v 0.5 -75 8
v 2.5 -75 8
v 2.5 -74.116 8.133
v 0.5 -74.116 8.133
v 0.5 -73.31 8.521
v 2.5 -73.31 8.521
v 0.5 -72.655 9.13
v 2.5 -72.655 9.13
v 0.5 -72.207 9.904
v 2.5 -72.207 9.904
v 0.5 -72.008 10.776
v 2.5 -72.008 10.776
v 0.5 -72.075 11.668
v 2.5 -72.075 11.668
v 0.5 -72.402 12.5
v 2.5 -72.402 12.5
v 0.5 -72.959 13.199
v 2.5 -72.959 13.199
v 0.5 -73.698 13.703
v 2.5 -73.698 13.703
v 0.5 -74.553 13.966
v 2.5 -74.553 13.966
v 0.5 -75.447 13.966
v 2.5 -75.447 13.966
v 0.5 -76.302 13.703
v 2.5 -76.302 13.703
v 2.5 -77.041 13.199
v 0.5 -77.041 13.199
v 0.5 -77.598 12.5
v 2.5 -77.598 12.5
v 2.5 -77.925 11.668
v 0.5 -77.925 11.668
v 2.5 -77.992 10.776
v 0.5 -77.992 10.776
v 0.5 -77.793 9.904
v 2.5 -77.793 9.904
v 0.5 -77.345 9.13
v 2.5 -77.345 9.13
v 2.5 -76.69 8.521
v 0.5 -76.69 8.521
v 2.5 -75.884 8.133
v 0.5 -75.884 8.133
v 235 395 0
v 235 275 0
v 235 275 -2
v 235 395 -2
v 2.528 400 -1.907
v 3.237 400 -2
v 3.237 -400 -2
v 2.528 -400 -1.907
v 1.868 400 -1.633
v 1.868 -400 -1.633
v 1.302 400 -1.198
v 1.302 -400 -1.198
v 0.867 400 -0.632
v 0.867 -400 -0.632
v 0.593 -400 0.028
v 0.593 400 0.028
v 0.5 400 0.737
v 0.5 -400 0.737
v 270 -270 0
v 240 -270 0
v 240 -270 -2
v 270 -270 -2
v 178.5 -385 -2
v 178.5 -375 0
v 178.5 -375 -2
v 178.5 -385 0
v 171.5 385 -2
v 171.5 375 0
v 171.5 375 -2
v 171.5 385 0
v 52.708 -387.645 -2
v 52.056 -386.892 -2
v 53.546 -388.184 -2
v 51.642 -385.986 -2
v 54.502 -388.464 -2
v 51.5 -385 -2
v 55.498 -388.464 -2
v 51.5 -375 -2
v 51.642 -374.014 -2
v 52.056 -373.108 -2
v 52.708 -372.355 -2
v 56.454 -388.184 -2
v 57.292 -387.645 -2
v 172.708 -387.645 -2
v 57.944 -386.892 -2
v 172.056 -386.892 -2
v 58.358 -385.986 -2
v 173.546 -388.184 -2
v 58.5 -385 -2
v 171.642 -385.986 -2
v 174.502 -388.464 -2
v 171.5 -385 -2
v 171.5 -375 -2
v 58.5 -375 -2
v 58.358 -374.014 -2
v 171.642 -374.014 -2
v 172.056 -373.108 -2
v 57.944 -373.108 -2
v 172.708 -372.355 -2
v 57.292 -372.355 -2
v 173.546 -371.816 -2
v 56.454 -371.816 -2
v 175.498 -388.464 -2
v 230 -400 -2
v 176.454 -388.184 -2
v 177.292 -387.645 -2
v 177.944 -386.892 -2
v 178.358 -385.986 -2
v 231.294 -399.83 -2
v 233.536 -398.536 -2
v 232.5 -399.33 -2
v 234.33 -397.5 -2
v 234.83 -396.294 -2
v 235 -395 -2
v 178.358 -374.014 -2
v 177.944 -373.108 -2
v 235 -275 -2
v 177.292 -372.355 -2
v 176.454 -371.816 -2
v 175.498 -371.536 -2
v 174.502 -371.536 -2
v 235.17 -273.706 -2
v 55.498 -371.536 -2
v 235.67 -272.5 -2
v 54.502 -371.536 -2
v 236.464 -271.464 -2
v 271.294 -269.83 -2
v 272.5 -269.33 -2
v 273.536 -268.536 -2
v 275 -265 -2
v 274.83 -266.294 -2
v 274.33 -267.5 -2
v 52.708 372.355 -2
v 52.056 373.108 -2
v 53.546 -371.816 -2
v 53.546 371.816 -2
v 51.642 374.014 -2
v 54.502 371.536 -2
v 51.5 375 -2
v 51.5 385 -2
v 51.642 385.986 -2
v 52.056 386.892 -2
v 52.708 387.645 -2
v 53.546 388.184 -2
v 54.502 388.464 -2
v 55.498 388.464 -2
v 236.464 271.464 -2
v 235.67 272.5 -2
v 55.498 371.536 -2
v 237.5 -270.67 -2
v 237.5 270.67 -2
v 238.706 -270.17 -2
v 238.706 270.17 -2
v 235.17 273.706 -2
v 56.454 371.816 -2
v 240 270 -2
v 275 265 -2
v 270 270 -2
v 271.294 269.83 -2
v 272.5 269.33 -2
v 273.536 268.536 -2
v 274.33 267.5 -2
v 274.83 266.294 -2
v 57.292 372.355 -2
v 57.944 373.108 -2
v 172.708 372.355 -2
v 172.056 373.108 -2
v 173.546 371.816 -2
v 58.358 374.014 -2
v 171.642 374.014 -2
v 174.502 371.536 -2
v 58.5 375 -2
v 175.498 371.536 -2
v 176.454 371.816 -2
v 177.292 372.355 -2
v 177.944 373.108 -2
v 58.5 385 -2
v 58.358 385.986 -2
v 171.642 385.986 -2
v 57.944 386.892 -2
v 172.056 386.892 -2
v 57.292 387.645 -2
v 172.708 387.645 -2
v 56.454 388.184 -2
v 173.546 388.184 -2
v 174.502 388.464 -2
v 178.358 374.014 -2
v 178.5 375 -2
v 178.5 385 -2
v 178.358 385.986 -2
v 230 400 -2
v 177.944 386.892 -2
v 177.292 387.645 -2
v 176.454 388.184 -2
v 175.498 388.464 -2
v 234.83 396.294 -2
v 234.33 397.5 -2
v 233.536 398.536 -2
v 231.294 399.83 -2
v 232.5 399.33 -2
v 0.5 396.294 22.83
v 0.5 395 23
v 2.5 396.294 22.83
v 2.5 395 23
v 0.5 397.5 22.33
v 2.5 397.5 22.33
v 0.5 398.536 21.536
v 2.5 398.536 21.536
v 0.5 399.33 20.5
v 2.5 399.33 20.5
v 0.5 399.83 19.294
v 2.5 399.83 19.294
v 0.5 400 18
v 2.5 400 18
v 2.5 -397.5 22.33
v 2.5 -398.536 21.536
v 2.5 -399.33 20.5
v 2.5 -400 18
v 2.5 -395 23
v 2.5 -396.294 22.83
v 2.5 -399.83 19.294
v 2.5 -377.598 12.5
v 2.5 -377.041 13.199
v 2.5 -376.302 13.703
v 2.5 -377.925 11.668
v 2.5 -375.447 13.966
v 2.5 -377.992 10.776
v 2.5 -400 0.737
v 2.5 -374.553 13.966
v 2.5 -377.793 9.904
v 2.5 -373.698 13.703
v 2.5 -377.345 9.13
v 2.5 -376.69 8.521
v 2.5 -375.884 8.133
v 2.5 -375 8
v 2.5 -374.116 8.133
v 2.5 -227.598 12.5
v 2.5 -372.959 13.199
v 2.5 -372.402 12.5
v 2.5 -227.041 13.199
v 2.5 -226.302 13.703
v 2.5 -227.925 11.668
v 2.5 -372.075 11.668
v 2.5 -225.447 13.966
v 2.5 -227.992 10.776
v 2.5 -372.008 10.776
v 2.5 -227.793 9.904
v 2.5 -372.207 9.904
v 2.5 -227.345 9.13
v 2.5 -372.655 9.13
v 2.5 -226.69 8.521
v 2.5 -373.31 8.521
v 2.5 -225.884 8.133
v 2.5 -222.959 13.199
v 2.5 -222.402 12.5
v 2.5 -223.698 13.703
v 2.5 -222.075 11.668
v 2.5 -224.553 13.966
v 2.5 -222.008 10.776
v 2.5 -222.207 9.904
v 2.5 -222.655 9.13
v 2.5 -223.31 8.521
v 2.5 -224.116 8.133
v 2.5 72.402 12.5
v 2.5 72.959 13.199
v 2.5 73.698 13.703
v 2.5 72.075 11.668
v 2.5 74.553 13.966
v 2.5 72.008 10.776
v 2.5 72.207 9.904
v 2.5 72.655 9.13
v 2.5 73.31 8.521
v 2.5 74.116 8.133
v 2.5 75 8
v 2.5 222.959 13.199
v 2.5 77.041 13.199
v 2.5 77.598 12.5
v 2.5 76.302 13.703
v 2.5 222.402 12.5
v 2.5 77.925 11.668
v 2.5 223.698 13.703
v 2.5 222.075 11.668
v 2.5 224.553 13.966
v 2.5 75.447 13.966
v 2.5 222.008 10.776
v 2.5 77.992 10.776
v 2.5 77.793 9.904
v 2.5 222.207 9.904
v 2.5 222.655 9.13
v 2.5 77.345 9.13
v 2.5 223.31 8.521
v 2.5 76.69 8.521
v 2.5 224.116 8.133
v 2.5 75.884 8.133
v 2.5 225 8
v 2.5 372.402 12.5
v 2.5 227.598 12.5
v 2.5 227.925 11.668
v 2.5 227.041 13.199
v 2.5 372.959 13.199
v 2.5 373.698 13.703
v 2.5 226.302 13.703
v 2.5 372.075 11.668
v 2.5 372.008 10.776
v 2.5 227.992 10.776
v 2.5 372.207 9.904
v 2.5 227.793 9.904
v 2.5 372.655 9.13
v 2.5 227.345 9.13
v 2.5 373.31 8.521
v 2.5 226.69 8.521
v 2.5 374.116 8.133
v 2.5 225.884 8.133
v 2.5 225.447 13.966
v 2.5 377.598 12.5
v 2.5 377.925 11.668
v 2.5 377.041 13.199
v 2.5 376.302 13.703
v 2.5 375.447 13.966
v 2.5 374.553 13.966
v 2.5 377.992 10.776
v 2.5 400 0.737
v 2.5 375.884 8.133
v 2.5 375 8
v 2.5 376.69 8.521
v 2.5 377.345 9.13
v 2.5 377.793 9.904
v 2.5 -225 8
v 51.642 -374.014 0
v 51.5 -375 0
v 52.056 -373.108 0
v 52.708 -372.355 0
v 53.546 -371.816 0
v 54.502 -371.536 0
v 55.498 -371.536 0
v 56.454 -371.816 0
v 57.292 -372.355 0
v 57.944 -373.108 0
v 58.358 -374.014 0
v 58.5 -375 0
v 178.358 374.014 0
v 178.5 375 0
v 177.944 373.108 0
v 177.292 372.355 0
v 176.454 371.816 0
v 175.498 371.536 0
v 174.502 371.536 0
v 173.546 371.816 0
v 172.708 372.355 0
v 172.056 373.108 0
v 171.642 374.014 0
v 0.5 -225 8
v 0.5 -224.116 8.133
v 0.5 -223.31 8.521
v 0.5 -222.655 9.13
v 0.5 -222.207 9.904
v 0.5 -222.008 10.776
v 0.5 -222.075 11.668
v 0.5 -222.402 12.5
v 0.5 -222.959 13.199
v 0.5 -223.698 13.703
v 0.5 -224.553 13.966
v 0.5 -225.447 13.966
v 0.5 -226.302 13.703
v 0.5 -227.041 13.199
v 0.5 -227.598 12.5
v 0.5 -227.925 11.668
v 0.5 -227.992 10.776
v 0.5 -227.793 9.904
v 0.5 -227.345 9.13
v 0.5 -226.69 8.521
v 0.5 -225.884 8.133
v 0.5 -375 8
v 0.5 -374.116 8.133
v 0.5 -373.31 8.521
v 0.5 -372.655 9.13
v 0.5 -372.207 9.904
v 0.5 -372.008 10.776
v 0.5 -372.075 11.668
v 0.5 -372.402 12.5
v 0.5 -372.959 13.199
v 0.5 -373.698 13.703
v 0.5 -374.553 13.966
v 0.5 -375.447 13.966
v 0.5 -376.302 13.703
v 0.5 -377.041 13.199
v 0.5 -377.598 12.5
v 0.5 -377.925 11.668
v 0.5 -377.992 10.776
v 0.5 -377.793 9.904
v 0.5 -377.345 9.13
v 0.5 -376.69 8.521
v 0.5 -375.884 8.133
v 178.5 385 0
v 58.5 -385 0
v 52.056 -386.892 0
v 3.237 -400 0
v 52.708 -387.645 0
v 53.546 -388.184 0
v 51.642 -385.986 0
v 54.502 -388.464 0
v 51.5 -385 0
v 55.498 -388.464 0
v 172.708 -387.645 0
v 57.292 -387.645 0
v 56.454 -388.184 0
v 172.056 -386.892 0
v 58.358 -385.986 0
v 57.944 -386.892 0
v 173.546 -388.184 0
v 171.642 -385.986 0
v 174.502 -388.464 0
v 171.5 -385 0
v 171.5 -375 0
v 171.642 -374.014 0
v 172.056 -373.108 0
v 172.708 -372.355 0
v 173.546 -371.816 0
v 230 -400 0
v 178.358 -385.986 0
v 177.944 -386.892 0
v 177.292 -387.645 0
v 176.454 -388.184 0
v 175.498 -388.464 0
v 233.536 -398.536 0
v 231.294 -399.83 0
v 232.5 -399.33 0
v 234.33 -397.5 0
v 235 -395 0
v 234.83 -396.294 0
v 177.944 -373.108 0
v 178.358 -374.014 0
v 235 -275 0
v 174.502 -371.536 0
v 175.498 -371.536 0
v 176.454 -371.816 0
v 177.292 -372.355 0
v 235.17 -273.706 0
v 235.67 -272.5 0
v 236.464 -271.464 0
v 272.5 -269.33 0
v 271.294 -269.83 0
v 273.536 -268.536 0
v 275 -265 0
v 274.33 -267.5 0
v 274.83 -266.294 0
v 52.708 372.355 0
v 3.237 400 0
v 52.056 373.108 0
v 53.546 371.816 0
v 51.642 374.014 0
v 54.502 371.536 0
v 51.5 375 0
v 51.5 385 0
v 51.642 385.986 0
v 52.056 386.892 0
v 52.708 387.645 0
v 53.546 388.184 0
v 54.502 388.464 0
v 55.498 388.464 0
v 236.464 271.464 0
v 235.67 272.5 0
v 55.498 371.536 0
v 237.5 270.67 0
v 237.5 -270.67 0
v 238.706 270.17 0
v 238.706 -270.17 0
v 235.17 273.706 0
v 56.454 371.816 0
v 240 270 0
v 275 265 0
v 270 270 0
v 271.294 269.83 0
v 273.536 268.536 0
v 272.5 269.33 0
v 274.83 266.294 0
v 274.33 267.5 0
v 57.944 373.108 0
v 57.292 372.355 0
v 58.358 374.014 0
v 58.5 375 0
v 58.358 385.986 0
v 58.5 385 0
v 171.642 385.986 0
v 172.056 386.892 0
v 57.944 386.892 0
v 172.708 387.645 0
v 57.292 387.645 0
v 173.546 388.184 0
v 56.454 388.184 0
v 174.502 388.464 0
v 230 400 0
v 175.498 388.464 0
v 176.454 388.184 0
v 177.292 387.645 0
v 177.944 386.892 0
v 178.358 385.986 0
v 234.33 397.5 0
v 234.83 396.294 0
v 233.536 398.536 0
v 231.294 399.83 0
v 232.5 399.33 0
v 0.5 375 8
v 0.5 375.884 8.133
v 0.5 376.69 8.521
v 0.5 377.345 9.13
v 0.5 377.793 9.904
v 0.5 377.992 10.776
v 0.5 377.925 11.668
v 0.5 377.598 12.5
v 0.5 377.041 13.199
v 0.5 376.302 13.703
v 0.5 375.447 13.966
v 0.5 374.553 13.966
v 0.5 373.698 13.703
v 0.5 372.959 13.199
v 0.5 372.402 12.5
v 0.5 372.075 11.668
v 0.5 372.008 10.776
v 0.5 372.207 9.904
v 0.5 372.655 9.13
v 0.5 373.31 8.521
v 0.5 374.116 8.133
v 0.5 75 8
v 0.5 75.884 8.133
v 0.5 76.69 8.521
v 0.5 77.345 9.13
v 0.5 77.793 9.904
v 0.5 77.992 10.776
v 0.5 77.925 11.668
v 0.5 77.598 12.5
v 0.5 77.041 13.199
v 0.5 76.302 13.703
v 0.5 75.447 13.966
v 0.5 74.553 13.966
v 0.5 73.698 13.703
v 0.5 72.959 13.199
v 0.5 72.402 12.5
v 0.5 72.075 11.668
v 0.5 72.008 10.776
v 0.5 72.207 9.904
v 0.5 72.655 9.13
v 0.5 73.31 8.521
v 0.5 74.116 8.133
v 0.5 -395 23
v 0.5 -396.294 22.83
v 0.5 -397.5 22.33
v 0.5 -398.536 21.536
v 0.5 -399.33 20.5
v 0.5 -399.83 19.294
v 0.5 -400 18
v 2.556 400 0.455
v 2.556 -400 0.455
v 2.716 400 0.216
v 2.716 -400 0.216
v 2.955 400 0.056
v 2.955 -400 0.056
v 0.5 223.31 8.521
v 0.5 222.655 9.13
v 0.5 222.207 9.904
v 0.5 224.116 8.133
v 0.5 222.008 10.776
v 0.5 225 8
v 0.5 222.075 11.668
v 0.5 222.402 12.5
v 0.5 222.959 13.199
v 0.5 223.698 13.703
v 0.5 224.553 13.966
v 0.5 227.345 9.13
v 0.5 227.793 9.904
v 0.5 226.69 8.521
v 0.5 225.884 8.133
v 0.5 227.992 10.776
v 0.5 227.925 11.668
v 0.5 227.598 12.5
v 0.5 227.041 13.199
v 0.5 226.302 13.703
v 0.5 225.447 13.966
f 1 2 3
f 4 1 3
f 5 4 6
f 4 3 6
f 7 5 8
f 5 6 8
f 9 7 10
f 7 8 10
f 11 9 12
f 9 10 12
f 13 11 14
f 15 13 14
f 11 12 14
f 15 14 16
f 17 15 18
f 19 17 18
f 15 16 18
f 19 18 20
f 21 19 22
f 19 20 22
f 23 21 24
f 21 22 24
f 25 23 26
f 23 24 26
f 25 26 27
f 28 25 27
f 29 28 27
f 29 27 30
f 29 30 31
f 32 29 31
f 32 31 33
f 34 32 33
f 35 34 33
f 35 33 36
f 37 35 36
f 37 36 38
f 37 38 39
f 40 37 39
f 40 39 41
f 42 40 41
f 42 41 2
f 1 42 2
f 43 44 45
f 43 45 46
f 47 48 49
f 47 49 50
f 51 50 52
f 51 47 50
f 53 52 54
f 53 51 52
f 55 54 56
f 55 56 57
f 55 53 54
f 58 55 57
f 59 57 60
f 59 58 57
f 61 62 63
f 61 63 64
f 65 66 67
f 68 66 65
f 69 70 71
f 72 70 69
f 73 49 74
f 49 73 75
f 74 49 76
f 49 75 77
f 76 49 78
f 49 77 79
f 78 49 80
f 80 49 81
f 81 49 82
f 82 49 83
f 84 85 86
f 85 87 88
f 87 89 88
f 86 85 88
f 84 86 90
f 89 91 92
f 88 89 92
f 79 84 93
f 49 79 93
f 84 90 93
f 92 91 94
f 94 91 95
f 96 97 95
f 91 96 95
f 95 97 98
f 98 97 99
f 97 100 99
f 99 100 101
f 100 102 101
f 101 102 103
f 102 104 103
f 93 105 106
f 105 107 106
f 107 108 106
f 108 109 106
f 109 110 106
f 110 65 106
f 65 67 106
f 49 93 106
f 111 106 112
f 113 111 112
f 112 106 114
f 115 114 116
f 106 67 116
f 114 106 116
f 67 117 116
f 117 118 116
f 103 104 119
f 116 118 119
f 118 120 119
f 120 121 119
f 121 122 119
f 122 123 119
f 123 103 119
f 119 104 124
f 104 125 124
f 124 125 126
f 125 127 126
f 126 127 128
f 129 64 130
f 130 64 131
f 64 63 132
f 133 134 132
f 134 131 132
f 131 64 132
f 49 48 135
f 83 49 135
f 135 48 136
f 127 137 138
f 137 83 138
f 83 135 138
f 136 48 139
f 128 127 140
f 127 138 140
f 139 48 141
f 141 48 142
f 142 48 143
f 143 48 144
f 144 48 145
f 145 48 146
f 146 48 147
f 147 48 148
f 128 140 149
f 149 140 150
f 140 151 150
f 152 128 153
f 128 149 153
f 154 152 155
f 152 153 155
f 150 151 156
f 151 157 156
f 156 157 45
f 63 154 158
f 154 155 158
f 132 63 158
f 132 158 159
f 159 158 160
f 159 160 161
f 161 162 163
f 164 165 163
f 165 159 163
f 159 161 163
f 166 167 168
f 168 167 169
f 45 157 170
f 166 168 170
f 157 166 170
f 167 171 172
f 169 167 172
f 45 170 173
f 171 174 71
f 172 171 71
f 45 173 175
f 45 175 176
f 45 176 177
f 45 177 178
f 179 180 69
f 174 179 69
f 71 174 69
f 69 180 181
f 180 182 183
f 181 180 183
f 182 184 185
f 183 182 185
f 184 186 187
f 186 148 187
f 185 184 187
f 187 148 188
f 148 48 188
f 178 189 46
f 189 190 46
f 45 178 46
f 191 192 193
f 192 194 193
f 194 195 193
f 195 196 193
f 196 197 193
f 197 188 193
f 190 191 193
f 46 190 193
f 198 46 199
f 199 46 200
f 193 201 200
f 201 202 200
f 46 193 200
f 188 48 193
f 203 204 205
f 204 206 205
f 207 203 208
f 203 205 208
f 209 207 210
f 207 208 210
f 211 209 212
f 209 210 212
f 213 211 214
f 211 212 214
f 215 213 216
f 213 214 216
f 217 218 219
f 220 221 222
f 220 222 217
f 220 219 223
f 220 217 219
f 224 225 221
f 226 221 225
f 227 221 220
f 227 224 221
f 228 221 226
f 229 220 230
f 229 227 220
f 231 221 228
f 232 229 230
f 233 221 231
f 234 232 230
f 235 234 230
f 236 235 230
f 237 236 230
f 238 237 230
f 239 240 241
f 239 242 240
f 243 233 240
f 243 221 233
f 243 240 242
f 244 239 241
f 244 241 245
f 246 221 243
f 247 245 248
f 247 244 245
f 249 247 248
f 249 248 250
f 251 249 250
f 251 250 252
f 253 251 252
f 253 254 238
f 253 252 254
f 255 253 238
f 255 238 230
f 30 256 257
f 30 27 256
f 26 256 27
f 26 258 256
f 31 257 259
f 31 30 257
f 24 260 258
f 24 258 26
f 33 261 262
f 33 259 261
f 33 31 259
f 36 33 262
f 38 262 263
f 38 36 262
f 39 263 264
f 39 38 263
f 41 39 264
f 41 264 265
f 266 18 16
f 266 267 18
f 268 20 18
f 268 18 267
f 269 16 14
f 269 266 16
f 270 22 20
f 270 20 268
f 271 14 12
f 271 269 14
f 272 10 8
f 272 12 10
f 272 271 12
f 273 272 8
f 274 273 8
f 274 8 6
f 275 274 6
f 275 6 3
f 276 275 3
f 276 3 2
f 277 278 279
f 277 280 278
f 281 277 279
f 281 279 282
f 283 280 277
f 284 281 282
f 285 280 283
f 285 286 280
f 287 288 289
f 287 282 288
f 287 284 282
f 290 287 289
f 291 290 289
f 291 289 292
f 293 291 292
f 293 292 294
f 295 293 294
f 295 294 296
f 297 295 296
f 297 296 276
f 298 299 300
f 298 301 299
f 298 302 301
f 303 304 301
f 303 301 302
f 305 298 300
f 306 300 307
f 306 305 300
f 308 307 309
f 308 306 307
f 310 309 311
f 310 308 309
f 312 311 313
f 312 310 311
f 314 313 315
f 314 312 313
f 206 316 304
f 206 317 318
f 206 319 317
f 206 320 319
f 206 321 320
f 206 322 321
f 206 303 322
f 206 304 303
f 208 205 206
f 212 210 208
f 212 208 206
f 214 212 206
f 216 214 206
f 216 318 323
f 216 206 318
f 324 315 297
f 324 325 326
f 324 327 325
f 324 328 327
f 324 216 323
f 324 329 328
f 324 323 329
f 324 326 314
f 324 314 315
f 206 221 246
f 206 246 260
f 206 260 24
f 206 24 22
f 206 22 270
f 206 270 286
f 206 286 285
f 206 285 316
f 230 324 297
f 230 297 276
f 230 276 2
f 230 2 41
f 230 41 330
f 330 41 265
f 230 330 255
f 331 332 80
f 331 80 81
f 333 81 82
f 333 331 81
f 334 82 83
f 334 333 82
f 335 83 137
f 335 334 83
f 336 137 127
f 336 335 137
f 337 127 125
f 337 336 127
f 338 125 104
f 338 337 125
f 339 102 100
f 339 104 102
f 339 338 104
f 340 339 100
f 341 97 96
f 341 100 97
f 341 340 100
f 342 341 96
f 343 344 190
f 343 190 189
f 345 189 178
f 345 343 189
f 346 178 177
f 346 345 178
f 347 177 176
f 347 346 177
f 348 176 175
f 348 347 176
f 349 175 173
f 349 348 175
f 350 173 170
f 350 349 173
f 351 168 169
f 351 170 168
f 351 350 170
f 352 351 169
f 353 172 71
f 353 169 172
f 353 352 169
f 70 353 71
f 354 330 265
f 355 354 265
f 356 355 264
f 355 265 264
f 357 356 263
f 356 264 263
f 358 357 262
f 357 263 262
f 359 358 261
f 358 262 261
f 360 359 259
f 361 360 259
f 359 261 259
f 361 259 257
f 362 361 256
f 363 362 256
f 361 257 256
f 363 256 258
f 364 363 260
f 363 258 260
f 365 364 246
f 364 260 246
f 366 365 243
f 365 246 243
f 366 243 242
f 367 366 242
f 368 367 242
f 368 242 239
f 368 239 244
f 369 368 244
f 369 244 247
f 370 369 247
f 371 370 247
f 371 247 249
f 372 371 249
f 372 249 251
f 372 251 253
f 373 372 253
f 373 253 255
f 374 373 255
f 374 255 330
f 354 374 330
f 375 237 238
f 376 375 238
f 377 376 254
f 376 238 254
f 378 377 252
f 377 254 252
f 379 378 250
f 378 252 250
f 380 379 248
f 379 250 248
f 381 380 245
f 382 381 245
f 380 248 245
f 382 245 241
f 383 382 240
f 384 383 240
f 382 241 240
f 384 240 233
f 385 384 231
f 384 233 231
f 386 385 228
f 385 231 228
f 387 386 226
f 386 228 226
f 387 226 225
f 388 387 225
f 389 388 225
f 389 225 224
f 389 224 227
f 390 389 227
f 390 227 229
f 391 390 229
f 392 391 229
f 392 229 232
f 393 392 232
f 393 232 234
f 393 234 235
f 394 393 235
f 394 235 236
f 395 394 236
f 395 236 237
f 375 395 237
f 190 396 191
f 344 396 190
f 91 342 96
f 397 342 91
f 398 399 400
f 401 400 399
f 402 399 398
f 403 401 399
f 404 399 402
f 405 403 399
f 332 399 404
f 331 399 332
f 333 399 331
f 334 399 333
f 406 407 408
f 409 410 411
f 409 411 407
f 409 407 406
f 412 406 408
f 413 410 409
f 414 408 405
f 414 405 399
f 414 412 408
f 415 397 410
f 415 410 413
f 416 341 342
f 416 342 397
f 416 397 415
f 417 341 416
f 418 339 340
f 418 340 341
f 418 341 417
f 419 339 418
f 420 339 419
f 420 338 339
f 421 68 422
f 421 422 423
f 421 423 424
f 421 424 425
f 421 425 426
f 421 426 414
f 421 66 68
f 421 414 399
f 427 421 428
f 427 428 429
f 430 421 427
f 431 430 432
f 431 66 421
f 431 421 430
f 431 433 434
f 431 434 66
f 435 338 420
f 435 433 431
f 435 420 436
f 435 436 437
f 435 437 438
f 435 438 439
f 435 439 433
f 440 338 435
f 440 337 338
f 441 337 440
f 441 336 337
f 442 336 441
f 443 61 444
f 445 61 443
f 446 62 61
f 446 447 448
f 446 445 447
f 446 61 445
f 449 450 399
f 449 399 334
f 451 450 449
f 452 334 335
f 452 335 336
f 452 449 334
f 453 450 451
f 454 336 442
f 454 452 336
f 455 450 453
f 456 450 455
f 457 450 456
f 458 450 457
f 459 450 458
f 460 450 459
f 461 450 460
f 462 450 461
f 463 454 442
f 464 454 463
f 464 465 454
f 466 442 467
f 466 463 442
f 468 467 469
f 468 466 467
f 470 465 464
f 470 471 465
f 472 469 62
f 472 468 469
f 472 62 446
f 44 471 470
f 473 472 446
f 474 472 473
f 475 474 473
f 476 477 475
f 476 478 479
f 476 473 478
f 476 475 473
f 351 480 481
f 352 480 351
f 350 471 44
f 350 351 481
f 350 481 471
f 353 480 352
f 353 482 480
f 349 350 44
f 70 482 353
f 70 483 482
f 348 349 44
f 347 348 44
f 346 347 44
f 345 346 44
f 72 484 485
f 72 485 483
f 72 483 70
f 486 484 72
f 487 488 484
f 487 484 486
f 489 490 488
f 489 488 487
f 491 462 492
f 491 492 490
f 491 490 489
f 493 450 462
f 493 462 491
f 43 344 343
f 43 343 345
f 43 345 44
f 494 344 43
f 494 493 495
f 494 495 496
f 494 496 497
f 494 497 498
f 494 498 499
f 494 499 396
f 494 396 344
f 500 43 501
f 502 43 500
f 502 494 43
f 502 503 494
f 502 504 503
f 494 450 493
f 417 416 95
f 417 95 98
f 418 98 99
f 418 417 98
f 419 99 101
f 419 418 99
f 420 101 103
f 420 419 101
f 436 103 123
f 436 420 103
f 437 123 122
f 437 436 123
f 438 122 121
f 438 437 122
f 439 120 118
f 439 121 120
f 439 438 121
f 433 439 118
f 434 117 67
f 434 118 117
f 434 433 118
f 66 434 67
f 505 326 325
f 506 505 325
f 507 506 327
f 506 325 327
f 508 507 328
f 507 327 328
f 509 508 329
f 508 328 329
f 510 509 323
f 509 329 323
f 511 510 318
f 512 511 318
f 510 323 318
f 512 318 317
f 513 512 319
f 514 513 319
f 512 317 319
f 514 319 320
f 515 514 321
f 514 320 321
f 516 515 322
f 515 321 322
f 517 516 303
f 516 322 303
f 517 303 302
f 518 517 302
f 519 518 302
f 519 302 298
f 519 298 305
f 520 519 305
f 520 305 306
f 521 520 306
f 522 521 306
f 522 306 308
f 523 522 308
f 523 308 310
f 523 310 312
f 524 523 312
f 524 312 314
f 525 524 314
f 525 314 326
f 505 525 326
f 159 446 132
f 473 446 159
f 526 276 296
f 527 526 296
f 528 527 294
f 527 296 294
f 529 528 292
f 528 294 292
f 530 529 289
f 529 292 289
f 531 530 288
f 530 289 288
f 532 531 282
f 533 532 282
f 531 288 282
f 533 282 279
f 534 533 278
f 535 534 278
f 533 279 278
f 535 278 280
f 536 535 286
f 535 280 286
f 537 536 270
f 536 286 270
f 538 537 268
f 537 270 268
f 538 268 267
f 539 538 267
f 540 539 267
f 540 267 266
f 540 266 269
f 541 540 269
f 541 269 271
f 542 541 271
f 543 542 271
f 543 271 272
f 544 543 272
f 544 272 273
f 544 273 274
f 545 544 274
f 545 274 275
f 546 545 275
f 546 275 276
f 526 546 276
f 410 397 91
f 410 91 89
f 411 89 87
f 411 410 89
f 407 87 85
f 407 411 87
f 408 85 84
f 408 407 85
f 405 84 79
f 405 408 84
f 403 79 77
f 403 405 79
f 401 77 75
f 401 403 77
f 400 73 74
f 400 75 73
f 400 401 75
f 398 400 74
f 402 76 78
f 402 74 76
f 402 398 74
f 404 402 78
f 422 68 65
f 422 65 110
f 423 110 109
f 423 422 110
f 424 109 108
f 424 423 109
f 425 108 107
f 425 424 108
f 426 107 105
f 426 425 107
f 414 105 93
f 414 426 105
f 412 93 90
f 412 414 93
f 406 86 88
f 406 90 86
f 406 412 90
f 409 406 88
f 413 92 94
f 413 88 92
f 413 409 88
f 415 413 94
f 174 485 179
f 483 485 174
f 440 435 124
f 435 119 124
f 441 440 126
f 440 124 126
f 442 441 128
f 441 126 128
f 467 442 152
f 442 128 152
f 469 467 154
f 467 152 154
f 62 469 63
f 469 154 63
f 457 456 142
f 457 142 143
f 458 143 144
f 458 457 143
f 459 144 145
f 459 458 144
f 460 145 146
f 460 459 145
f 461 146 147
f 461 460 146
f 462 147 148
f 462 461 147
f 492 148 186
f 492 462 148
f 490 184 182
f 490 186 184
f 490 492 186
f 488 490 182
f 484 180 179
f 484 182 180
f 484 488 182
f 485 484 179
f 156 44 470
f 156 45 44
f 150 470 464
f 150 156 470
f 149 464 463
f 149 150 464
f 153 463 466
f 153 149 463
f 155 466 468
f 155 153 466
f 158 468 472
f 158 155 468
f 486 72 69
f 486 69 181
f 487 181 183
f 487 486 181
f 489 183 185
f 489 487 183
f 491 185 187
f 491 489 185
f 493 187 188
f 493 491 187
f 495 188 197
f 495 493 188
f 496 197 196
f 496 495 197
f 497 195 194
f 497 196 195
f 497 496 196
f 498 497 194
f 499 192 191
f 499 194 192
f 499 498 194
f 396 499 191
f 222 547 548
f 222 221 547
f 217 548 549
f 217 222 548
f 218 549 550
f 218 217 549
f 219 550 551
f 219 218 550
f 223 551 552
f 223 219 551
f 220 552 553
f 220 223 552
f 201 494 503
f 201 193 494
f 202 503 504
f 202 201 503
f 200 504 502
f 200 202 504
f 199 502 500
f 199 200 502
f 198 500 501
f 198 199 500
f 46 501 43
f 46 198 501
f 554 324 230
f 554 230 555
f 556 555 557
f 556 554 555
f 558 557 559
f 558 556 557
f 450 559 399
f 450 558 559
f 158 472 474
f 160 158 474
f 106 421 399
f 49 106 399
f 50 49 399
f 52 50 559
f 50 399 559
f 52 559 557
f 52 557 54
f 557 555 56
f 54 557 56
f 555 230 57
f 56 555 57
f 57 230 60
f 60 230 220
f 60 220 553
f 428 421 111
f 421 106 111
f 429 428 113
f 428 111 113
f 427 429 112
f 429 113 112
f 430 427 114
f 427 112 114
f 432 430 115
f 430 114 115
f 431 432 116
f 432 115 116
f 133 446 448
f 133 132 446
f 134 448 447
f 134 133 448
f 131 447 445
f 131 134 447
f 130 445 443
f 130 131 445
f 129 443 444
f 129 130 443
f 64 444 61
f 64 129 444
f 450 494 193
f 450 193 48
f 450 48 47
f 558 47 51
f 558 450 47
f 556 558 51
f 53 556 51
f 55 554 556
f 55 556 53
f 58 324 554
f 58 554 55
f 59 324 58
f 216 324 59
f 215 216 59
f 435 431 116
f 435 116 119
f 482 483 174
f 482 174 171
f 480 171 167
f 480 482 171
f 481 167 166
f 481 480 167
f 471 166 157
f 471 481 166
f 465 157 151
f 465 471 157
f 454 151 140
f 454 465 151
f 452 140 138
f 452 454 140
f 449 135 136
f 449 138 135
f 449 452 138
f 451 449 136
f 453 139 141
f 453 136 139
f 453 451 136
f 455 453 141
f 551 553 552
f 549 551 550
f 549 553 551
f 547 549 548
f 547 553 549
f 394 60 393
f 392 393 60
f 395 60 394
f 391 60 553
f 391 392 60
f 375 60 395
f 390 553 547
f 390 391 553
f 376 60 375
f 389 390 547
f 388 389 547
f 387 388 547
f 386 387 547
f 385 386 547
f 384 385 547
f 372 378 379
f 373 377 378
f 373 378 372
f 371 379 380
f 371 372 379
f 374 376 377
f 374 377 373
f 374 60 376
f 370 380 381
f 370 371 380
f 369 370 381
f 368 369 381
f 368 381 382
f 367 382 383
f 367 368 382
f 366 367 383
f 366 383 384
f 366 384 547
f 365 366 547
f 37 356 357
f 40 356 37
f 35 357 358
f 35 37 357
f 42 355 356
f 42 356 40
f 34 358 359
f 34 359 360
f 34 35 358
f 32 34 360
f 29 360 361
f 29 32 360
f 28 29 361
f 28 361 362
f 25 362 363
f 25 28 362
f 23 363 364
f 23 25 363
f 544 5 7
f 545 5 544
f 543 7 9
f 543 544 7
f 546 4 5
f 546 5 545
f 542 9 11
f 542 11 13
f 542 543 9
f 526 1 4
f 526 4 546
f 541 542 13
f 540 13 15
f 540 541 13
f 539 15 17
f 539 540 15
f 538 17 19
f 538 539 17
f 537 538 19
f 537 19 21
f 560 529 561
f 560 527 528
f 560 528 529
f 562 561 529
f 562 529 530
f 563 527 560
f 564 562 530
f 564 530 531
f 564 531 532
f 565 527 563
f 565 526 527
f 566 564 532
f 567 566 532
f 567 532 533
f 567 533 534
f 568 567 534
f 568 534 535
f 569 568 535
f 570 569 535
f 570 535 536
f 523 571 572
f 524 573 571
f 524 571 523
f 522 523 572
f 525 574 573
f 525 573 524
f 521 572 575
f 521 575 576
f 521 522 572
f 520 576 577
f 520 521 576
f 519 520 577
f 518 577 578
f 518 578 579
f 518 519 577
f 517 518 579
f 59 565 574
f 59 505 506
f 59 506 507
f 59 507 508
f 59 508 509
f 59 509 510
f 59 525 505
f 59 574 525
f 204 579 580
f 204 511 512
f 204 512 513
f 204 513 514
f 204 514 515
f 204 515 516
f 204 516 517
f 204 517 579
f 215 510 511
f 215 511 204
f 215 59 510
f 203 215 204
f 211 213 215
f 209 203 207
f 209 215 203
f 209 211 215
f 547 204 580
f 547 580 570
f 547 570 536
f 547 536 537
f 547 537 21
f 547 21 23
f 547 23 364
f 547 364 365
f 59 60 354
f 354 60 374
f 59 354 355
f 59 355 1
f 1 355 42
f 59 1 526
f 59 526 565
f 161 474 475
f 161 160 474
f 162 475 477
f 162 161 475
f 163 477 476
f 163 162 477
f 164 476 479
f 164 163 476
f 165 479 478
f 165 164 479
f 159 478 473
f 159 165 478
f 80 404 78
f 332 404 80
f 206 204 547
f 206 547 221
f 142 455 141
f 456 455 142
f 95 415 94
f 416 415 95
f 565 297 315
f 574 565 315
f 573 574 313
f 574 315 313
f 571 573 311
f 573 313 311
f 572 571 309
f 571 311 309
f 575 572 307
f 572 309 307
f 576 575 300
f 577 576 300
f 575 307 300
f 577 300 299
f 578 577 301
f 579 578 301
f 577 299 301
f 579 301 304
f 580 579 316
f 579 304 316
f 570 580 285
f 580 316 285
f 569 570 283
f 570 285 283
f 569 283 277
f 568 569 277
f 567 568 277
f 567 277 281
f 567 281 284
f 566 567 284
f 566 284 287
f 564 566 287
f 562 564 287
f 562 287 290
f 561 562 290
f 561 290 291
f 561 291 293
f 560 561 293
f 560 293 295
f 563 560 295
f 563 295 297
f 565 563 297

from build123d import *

# Parameters (mm, degrees)
SKETCH_1_W                       = 550
SKETCH_1_H                       = 800
SM_BASE_FLANGE_1_DEPTH           = 2
SKETCH_6_W                       = 40
SKETCH_6_H                       = 130
CUT_EXTRUDE_1_DEPTH              = 10
FILLET_1_R                       = 5
SKETCH_7_W                       = 1
SKETCH_7_H                       = 845.505579408
CUT_EXTRUDE_2_DEPTH              = 10
SKETCH_8_W                       = 316.431651149
SKETCH_8_H                       = 807.863383274
CUT_EXTRUDE_3_DEPTH              = 10
SM_EDGE_FLANGE_1_STRIP_W         = 9.4732
SM_EDGE_FLANGE_1_STRIP_H         = 2
SM_EDGE_FLANGE_1_STRIP_CUT_DEPTH = 800
SM_EDGE_FLANGE_1_DEPTH           = 800
FILLET_2_R                       = 5
CUT_EXTRUDE_4_DEPTH              = 10
SKETCH_13_R                      = 3
CUT_EXTRUDE_5_DEPTH              = 10
PATTERN_LINEAR_1_COUNT           = 6
PATTERN_LINEAR_1_PITCH           = 150


# Sheet-metal steps are written as plain solids
with BuildPart() as part:
    # Sketch 1 → 基体-法兰1 (new body)
    with BuildSketch(Plane.XY):
        Rectangle(SKETCH_1_W, SKETCH_1_H)
    extrude(amount=-SM_BASE_FLANGE_1_DEPTH)

    # 草图6 → 切除-拉伸1 (cut)
    with BuildSketch(Plane.XY):
        with Locations((255, 335)):
            Rectangle(SKETCH_6_W, SKETCH_6_H)
        with Locations((255, -335)):
            Rectangle(SKETCH_6_W, SKETCH_6_H)
    extrude(amount=-CUT_EXTRUDE_1_DEPTH, mode=Mode.SUBTRACT)

    # 圆角1
    fillet_1_edges = [part.edges().sort_by_distance(p)[0] for p in [
        (275, 270, -1),
        (235, 270, -1),
        (235, 400, -1),
        (275, -270, -1),
        (235, -400, -1),
        (235, -270, -1),
        (-275, 400, -1),
        (-275, -400, -1),
    ]]
    fillet(fillet_1_edges, radius=FILLET_1_R)

    # 草图7 → 切除-拉伸2 (cut)
    with BuildSketch(Plane.XY):
        Rectangle(SKETCH_7_W, SKETCH_7_H)
    extrude(amount=-CUT_EXTRUDE_2_DEPTH, mode=Mode.SUBTRACT)


with BuildPart() as cut_extrude_2_piece_1:
    # of the separate pieces the step leaves, piece 1, a body of its own (cut_extrude_2_pieces)
    add(part.part.solids().sort_by_distance((-0.5, -400, 0))[0])

    # 草图8 → 切除-拉伸3 (cut)
    with BuildSketch(Plane.XY):
        with Locations((-158.715825575, -3.931691637)):
            Rectangle(SKETCH_8_W, SKETCH_8_H)
    extrude(amount=-CUT_EXTRUDE_3_DEPTH, mode=Mode.SUBTRACT)


with BuildPart() as cut_extrude_2_piece_2:
    # of the separate pieces the step leaves, piece 2, a body of its own (cut_extrude_2_pieces)
    add(part.part.solids().sort_by_distance((230, -400, 0))[0])

    # 边线-法兰1 strip (across the edge) → 边线-法兰1 strip cut (cut)
    with BuildSketch(Plane(origin=(0.5, 400, 0), x_dir=(1, 0, 0), z_dir=(0, -1, 0))):
        with Locations((-2, -1)):
            Rectangle(SM_EDGE_FLANGE_1_STRIP_W, SM_EDGE_FLANGE_1_STRIP_H)
    extrude(amount=SM_EDGE_FLANGE_1_STRIP_CUT_DEPTH, mode=Mode.SUBTRACT)

    # 边线-法兰1 section (across the edge) → 边线-法兰1 (add)
    with BuildSketch(Plane(origin=(0.5, 400, 0), x_dir=(1, 0, 0), z_dir=(0, -1, 0))):
        with BuildLine():
            Line((0, 0.7366), (0, 23))
            Line((0, 23), (2, 23))
            Line((2, 23), (2, 0.7366))
            ThreePointArc((2, 0.7366), (2.215745145, 0.215745145), (2.7366, 0))
            Line((2.7366, 0), (2.7366, -2))
            ThreePointArc((2.7366, -2), (0.801531583, -1.198468417), (0, 0.7366))
        make_face()
    extrude(amount=SM_EDGE_FLANGE_1_DEPTH)

    # 圆角2
    fillet_2_edges = [cut_extrude_2_piece_2.edges().sort_by_distance(p)[0] for p in [
        (1.5, 400, 23),
        (1.5, -400, 23),
    ]]
    fillet(fillet_2_edges, radius=FILLET_2_R)

    # 草图12 → 切除-拉伸4 (cut)
    with BuildSketch(Plane.XY):
        with BuildLine():
            Line((51.5, 375), (51.5, 385))
            ThreePointArc((51.5, 385), (55, 388.5), (58.5, 385))
            Line((58.5, 385), (58.5, 375))
            ThreePointArc((58.5, 375), (55, 371.5), (51.5, 375))
        make_face()
        with BuildLine():
            Line((171.5, 375), (171.5, 385))
            ThreePointArc((171.5, 385), (175, 388.5), (178.5, 385))
            Line((178.5, 385), (178.5, 375))
            ThreePointArc((178.5, 375), (175, 371.5), (171.5, 375))
        make_face()
        with BuildLine():
            Line((51.5, -385), (51.5, -375))
            ThreePointArc((51.5, -375), (55, -371.5), (58.5, -375))
            Line((58.5, -375), (58.5, -385))
            ThreePointArc((58.5, -385), (55, -388.5), (51.5, -385))
        make_face()
        with BuildLine():
            Line((171.5, -385), (171.5, -375))
            ThreePointArc((171.5, -375), (175, -371.5), (178.5, -375))
            Line((178.5, -375), (178.5, -385))
            ThreePointArc((178.5, -385), (175, -388.5), (171.5, -385))
        make_face()
    extrude(amount=-CUT_EXTRUDE_4_DEPTH, mode=Mode.SUBTRACT)

    # 草图13 → 切除-拉伸5 (cut)
    with BuildSketch(Plane(origin=(2.5, 0, 0), x_dir=(0, 0, -1), z_dir=(1, 0, 0))):
        with Locations((-11, -375)):
            Circle(SKETCH_13_R)
    cut_extrude_5 = extrude(amount=-CUT_EXTRUDE_5_DEPTH, mode=Mode.SUBTRACT)

    # 阵列(线性)1: 切除-拉伸5 ×6
    with Locations(*[(0, i * PATTERN_LINEAR_1_PITCH, 0) for i in range(1, PATTERN_LINEAR_1_COUNT)]):
        add(cut_extrude_5, mode=Mode.SUBTRACT)


solid = cut_extrude_2_piece_2.part
